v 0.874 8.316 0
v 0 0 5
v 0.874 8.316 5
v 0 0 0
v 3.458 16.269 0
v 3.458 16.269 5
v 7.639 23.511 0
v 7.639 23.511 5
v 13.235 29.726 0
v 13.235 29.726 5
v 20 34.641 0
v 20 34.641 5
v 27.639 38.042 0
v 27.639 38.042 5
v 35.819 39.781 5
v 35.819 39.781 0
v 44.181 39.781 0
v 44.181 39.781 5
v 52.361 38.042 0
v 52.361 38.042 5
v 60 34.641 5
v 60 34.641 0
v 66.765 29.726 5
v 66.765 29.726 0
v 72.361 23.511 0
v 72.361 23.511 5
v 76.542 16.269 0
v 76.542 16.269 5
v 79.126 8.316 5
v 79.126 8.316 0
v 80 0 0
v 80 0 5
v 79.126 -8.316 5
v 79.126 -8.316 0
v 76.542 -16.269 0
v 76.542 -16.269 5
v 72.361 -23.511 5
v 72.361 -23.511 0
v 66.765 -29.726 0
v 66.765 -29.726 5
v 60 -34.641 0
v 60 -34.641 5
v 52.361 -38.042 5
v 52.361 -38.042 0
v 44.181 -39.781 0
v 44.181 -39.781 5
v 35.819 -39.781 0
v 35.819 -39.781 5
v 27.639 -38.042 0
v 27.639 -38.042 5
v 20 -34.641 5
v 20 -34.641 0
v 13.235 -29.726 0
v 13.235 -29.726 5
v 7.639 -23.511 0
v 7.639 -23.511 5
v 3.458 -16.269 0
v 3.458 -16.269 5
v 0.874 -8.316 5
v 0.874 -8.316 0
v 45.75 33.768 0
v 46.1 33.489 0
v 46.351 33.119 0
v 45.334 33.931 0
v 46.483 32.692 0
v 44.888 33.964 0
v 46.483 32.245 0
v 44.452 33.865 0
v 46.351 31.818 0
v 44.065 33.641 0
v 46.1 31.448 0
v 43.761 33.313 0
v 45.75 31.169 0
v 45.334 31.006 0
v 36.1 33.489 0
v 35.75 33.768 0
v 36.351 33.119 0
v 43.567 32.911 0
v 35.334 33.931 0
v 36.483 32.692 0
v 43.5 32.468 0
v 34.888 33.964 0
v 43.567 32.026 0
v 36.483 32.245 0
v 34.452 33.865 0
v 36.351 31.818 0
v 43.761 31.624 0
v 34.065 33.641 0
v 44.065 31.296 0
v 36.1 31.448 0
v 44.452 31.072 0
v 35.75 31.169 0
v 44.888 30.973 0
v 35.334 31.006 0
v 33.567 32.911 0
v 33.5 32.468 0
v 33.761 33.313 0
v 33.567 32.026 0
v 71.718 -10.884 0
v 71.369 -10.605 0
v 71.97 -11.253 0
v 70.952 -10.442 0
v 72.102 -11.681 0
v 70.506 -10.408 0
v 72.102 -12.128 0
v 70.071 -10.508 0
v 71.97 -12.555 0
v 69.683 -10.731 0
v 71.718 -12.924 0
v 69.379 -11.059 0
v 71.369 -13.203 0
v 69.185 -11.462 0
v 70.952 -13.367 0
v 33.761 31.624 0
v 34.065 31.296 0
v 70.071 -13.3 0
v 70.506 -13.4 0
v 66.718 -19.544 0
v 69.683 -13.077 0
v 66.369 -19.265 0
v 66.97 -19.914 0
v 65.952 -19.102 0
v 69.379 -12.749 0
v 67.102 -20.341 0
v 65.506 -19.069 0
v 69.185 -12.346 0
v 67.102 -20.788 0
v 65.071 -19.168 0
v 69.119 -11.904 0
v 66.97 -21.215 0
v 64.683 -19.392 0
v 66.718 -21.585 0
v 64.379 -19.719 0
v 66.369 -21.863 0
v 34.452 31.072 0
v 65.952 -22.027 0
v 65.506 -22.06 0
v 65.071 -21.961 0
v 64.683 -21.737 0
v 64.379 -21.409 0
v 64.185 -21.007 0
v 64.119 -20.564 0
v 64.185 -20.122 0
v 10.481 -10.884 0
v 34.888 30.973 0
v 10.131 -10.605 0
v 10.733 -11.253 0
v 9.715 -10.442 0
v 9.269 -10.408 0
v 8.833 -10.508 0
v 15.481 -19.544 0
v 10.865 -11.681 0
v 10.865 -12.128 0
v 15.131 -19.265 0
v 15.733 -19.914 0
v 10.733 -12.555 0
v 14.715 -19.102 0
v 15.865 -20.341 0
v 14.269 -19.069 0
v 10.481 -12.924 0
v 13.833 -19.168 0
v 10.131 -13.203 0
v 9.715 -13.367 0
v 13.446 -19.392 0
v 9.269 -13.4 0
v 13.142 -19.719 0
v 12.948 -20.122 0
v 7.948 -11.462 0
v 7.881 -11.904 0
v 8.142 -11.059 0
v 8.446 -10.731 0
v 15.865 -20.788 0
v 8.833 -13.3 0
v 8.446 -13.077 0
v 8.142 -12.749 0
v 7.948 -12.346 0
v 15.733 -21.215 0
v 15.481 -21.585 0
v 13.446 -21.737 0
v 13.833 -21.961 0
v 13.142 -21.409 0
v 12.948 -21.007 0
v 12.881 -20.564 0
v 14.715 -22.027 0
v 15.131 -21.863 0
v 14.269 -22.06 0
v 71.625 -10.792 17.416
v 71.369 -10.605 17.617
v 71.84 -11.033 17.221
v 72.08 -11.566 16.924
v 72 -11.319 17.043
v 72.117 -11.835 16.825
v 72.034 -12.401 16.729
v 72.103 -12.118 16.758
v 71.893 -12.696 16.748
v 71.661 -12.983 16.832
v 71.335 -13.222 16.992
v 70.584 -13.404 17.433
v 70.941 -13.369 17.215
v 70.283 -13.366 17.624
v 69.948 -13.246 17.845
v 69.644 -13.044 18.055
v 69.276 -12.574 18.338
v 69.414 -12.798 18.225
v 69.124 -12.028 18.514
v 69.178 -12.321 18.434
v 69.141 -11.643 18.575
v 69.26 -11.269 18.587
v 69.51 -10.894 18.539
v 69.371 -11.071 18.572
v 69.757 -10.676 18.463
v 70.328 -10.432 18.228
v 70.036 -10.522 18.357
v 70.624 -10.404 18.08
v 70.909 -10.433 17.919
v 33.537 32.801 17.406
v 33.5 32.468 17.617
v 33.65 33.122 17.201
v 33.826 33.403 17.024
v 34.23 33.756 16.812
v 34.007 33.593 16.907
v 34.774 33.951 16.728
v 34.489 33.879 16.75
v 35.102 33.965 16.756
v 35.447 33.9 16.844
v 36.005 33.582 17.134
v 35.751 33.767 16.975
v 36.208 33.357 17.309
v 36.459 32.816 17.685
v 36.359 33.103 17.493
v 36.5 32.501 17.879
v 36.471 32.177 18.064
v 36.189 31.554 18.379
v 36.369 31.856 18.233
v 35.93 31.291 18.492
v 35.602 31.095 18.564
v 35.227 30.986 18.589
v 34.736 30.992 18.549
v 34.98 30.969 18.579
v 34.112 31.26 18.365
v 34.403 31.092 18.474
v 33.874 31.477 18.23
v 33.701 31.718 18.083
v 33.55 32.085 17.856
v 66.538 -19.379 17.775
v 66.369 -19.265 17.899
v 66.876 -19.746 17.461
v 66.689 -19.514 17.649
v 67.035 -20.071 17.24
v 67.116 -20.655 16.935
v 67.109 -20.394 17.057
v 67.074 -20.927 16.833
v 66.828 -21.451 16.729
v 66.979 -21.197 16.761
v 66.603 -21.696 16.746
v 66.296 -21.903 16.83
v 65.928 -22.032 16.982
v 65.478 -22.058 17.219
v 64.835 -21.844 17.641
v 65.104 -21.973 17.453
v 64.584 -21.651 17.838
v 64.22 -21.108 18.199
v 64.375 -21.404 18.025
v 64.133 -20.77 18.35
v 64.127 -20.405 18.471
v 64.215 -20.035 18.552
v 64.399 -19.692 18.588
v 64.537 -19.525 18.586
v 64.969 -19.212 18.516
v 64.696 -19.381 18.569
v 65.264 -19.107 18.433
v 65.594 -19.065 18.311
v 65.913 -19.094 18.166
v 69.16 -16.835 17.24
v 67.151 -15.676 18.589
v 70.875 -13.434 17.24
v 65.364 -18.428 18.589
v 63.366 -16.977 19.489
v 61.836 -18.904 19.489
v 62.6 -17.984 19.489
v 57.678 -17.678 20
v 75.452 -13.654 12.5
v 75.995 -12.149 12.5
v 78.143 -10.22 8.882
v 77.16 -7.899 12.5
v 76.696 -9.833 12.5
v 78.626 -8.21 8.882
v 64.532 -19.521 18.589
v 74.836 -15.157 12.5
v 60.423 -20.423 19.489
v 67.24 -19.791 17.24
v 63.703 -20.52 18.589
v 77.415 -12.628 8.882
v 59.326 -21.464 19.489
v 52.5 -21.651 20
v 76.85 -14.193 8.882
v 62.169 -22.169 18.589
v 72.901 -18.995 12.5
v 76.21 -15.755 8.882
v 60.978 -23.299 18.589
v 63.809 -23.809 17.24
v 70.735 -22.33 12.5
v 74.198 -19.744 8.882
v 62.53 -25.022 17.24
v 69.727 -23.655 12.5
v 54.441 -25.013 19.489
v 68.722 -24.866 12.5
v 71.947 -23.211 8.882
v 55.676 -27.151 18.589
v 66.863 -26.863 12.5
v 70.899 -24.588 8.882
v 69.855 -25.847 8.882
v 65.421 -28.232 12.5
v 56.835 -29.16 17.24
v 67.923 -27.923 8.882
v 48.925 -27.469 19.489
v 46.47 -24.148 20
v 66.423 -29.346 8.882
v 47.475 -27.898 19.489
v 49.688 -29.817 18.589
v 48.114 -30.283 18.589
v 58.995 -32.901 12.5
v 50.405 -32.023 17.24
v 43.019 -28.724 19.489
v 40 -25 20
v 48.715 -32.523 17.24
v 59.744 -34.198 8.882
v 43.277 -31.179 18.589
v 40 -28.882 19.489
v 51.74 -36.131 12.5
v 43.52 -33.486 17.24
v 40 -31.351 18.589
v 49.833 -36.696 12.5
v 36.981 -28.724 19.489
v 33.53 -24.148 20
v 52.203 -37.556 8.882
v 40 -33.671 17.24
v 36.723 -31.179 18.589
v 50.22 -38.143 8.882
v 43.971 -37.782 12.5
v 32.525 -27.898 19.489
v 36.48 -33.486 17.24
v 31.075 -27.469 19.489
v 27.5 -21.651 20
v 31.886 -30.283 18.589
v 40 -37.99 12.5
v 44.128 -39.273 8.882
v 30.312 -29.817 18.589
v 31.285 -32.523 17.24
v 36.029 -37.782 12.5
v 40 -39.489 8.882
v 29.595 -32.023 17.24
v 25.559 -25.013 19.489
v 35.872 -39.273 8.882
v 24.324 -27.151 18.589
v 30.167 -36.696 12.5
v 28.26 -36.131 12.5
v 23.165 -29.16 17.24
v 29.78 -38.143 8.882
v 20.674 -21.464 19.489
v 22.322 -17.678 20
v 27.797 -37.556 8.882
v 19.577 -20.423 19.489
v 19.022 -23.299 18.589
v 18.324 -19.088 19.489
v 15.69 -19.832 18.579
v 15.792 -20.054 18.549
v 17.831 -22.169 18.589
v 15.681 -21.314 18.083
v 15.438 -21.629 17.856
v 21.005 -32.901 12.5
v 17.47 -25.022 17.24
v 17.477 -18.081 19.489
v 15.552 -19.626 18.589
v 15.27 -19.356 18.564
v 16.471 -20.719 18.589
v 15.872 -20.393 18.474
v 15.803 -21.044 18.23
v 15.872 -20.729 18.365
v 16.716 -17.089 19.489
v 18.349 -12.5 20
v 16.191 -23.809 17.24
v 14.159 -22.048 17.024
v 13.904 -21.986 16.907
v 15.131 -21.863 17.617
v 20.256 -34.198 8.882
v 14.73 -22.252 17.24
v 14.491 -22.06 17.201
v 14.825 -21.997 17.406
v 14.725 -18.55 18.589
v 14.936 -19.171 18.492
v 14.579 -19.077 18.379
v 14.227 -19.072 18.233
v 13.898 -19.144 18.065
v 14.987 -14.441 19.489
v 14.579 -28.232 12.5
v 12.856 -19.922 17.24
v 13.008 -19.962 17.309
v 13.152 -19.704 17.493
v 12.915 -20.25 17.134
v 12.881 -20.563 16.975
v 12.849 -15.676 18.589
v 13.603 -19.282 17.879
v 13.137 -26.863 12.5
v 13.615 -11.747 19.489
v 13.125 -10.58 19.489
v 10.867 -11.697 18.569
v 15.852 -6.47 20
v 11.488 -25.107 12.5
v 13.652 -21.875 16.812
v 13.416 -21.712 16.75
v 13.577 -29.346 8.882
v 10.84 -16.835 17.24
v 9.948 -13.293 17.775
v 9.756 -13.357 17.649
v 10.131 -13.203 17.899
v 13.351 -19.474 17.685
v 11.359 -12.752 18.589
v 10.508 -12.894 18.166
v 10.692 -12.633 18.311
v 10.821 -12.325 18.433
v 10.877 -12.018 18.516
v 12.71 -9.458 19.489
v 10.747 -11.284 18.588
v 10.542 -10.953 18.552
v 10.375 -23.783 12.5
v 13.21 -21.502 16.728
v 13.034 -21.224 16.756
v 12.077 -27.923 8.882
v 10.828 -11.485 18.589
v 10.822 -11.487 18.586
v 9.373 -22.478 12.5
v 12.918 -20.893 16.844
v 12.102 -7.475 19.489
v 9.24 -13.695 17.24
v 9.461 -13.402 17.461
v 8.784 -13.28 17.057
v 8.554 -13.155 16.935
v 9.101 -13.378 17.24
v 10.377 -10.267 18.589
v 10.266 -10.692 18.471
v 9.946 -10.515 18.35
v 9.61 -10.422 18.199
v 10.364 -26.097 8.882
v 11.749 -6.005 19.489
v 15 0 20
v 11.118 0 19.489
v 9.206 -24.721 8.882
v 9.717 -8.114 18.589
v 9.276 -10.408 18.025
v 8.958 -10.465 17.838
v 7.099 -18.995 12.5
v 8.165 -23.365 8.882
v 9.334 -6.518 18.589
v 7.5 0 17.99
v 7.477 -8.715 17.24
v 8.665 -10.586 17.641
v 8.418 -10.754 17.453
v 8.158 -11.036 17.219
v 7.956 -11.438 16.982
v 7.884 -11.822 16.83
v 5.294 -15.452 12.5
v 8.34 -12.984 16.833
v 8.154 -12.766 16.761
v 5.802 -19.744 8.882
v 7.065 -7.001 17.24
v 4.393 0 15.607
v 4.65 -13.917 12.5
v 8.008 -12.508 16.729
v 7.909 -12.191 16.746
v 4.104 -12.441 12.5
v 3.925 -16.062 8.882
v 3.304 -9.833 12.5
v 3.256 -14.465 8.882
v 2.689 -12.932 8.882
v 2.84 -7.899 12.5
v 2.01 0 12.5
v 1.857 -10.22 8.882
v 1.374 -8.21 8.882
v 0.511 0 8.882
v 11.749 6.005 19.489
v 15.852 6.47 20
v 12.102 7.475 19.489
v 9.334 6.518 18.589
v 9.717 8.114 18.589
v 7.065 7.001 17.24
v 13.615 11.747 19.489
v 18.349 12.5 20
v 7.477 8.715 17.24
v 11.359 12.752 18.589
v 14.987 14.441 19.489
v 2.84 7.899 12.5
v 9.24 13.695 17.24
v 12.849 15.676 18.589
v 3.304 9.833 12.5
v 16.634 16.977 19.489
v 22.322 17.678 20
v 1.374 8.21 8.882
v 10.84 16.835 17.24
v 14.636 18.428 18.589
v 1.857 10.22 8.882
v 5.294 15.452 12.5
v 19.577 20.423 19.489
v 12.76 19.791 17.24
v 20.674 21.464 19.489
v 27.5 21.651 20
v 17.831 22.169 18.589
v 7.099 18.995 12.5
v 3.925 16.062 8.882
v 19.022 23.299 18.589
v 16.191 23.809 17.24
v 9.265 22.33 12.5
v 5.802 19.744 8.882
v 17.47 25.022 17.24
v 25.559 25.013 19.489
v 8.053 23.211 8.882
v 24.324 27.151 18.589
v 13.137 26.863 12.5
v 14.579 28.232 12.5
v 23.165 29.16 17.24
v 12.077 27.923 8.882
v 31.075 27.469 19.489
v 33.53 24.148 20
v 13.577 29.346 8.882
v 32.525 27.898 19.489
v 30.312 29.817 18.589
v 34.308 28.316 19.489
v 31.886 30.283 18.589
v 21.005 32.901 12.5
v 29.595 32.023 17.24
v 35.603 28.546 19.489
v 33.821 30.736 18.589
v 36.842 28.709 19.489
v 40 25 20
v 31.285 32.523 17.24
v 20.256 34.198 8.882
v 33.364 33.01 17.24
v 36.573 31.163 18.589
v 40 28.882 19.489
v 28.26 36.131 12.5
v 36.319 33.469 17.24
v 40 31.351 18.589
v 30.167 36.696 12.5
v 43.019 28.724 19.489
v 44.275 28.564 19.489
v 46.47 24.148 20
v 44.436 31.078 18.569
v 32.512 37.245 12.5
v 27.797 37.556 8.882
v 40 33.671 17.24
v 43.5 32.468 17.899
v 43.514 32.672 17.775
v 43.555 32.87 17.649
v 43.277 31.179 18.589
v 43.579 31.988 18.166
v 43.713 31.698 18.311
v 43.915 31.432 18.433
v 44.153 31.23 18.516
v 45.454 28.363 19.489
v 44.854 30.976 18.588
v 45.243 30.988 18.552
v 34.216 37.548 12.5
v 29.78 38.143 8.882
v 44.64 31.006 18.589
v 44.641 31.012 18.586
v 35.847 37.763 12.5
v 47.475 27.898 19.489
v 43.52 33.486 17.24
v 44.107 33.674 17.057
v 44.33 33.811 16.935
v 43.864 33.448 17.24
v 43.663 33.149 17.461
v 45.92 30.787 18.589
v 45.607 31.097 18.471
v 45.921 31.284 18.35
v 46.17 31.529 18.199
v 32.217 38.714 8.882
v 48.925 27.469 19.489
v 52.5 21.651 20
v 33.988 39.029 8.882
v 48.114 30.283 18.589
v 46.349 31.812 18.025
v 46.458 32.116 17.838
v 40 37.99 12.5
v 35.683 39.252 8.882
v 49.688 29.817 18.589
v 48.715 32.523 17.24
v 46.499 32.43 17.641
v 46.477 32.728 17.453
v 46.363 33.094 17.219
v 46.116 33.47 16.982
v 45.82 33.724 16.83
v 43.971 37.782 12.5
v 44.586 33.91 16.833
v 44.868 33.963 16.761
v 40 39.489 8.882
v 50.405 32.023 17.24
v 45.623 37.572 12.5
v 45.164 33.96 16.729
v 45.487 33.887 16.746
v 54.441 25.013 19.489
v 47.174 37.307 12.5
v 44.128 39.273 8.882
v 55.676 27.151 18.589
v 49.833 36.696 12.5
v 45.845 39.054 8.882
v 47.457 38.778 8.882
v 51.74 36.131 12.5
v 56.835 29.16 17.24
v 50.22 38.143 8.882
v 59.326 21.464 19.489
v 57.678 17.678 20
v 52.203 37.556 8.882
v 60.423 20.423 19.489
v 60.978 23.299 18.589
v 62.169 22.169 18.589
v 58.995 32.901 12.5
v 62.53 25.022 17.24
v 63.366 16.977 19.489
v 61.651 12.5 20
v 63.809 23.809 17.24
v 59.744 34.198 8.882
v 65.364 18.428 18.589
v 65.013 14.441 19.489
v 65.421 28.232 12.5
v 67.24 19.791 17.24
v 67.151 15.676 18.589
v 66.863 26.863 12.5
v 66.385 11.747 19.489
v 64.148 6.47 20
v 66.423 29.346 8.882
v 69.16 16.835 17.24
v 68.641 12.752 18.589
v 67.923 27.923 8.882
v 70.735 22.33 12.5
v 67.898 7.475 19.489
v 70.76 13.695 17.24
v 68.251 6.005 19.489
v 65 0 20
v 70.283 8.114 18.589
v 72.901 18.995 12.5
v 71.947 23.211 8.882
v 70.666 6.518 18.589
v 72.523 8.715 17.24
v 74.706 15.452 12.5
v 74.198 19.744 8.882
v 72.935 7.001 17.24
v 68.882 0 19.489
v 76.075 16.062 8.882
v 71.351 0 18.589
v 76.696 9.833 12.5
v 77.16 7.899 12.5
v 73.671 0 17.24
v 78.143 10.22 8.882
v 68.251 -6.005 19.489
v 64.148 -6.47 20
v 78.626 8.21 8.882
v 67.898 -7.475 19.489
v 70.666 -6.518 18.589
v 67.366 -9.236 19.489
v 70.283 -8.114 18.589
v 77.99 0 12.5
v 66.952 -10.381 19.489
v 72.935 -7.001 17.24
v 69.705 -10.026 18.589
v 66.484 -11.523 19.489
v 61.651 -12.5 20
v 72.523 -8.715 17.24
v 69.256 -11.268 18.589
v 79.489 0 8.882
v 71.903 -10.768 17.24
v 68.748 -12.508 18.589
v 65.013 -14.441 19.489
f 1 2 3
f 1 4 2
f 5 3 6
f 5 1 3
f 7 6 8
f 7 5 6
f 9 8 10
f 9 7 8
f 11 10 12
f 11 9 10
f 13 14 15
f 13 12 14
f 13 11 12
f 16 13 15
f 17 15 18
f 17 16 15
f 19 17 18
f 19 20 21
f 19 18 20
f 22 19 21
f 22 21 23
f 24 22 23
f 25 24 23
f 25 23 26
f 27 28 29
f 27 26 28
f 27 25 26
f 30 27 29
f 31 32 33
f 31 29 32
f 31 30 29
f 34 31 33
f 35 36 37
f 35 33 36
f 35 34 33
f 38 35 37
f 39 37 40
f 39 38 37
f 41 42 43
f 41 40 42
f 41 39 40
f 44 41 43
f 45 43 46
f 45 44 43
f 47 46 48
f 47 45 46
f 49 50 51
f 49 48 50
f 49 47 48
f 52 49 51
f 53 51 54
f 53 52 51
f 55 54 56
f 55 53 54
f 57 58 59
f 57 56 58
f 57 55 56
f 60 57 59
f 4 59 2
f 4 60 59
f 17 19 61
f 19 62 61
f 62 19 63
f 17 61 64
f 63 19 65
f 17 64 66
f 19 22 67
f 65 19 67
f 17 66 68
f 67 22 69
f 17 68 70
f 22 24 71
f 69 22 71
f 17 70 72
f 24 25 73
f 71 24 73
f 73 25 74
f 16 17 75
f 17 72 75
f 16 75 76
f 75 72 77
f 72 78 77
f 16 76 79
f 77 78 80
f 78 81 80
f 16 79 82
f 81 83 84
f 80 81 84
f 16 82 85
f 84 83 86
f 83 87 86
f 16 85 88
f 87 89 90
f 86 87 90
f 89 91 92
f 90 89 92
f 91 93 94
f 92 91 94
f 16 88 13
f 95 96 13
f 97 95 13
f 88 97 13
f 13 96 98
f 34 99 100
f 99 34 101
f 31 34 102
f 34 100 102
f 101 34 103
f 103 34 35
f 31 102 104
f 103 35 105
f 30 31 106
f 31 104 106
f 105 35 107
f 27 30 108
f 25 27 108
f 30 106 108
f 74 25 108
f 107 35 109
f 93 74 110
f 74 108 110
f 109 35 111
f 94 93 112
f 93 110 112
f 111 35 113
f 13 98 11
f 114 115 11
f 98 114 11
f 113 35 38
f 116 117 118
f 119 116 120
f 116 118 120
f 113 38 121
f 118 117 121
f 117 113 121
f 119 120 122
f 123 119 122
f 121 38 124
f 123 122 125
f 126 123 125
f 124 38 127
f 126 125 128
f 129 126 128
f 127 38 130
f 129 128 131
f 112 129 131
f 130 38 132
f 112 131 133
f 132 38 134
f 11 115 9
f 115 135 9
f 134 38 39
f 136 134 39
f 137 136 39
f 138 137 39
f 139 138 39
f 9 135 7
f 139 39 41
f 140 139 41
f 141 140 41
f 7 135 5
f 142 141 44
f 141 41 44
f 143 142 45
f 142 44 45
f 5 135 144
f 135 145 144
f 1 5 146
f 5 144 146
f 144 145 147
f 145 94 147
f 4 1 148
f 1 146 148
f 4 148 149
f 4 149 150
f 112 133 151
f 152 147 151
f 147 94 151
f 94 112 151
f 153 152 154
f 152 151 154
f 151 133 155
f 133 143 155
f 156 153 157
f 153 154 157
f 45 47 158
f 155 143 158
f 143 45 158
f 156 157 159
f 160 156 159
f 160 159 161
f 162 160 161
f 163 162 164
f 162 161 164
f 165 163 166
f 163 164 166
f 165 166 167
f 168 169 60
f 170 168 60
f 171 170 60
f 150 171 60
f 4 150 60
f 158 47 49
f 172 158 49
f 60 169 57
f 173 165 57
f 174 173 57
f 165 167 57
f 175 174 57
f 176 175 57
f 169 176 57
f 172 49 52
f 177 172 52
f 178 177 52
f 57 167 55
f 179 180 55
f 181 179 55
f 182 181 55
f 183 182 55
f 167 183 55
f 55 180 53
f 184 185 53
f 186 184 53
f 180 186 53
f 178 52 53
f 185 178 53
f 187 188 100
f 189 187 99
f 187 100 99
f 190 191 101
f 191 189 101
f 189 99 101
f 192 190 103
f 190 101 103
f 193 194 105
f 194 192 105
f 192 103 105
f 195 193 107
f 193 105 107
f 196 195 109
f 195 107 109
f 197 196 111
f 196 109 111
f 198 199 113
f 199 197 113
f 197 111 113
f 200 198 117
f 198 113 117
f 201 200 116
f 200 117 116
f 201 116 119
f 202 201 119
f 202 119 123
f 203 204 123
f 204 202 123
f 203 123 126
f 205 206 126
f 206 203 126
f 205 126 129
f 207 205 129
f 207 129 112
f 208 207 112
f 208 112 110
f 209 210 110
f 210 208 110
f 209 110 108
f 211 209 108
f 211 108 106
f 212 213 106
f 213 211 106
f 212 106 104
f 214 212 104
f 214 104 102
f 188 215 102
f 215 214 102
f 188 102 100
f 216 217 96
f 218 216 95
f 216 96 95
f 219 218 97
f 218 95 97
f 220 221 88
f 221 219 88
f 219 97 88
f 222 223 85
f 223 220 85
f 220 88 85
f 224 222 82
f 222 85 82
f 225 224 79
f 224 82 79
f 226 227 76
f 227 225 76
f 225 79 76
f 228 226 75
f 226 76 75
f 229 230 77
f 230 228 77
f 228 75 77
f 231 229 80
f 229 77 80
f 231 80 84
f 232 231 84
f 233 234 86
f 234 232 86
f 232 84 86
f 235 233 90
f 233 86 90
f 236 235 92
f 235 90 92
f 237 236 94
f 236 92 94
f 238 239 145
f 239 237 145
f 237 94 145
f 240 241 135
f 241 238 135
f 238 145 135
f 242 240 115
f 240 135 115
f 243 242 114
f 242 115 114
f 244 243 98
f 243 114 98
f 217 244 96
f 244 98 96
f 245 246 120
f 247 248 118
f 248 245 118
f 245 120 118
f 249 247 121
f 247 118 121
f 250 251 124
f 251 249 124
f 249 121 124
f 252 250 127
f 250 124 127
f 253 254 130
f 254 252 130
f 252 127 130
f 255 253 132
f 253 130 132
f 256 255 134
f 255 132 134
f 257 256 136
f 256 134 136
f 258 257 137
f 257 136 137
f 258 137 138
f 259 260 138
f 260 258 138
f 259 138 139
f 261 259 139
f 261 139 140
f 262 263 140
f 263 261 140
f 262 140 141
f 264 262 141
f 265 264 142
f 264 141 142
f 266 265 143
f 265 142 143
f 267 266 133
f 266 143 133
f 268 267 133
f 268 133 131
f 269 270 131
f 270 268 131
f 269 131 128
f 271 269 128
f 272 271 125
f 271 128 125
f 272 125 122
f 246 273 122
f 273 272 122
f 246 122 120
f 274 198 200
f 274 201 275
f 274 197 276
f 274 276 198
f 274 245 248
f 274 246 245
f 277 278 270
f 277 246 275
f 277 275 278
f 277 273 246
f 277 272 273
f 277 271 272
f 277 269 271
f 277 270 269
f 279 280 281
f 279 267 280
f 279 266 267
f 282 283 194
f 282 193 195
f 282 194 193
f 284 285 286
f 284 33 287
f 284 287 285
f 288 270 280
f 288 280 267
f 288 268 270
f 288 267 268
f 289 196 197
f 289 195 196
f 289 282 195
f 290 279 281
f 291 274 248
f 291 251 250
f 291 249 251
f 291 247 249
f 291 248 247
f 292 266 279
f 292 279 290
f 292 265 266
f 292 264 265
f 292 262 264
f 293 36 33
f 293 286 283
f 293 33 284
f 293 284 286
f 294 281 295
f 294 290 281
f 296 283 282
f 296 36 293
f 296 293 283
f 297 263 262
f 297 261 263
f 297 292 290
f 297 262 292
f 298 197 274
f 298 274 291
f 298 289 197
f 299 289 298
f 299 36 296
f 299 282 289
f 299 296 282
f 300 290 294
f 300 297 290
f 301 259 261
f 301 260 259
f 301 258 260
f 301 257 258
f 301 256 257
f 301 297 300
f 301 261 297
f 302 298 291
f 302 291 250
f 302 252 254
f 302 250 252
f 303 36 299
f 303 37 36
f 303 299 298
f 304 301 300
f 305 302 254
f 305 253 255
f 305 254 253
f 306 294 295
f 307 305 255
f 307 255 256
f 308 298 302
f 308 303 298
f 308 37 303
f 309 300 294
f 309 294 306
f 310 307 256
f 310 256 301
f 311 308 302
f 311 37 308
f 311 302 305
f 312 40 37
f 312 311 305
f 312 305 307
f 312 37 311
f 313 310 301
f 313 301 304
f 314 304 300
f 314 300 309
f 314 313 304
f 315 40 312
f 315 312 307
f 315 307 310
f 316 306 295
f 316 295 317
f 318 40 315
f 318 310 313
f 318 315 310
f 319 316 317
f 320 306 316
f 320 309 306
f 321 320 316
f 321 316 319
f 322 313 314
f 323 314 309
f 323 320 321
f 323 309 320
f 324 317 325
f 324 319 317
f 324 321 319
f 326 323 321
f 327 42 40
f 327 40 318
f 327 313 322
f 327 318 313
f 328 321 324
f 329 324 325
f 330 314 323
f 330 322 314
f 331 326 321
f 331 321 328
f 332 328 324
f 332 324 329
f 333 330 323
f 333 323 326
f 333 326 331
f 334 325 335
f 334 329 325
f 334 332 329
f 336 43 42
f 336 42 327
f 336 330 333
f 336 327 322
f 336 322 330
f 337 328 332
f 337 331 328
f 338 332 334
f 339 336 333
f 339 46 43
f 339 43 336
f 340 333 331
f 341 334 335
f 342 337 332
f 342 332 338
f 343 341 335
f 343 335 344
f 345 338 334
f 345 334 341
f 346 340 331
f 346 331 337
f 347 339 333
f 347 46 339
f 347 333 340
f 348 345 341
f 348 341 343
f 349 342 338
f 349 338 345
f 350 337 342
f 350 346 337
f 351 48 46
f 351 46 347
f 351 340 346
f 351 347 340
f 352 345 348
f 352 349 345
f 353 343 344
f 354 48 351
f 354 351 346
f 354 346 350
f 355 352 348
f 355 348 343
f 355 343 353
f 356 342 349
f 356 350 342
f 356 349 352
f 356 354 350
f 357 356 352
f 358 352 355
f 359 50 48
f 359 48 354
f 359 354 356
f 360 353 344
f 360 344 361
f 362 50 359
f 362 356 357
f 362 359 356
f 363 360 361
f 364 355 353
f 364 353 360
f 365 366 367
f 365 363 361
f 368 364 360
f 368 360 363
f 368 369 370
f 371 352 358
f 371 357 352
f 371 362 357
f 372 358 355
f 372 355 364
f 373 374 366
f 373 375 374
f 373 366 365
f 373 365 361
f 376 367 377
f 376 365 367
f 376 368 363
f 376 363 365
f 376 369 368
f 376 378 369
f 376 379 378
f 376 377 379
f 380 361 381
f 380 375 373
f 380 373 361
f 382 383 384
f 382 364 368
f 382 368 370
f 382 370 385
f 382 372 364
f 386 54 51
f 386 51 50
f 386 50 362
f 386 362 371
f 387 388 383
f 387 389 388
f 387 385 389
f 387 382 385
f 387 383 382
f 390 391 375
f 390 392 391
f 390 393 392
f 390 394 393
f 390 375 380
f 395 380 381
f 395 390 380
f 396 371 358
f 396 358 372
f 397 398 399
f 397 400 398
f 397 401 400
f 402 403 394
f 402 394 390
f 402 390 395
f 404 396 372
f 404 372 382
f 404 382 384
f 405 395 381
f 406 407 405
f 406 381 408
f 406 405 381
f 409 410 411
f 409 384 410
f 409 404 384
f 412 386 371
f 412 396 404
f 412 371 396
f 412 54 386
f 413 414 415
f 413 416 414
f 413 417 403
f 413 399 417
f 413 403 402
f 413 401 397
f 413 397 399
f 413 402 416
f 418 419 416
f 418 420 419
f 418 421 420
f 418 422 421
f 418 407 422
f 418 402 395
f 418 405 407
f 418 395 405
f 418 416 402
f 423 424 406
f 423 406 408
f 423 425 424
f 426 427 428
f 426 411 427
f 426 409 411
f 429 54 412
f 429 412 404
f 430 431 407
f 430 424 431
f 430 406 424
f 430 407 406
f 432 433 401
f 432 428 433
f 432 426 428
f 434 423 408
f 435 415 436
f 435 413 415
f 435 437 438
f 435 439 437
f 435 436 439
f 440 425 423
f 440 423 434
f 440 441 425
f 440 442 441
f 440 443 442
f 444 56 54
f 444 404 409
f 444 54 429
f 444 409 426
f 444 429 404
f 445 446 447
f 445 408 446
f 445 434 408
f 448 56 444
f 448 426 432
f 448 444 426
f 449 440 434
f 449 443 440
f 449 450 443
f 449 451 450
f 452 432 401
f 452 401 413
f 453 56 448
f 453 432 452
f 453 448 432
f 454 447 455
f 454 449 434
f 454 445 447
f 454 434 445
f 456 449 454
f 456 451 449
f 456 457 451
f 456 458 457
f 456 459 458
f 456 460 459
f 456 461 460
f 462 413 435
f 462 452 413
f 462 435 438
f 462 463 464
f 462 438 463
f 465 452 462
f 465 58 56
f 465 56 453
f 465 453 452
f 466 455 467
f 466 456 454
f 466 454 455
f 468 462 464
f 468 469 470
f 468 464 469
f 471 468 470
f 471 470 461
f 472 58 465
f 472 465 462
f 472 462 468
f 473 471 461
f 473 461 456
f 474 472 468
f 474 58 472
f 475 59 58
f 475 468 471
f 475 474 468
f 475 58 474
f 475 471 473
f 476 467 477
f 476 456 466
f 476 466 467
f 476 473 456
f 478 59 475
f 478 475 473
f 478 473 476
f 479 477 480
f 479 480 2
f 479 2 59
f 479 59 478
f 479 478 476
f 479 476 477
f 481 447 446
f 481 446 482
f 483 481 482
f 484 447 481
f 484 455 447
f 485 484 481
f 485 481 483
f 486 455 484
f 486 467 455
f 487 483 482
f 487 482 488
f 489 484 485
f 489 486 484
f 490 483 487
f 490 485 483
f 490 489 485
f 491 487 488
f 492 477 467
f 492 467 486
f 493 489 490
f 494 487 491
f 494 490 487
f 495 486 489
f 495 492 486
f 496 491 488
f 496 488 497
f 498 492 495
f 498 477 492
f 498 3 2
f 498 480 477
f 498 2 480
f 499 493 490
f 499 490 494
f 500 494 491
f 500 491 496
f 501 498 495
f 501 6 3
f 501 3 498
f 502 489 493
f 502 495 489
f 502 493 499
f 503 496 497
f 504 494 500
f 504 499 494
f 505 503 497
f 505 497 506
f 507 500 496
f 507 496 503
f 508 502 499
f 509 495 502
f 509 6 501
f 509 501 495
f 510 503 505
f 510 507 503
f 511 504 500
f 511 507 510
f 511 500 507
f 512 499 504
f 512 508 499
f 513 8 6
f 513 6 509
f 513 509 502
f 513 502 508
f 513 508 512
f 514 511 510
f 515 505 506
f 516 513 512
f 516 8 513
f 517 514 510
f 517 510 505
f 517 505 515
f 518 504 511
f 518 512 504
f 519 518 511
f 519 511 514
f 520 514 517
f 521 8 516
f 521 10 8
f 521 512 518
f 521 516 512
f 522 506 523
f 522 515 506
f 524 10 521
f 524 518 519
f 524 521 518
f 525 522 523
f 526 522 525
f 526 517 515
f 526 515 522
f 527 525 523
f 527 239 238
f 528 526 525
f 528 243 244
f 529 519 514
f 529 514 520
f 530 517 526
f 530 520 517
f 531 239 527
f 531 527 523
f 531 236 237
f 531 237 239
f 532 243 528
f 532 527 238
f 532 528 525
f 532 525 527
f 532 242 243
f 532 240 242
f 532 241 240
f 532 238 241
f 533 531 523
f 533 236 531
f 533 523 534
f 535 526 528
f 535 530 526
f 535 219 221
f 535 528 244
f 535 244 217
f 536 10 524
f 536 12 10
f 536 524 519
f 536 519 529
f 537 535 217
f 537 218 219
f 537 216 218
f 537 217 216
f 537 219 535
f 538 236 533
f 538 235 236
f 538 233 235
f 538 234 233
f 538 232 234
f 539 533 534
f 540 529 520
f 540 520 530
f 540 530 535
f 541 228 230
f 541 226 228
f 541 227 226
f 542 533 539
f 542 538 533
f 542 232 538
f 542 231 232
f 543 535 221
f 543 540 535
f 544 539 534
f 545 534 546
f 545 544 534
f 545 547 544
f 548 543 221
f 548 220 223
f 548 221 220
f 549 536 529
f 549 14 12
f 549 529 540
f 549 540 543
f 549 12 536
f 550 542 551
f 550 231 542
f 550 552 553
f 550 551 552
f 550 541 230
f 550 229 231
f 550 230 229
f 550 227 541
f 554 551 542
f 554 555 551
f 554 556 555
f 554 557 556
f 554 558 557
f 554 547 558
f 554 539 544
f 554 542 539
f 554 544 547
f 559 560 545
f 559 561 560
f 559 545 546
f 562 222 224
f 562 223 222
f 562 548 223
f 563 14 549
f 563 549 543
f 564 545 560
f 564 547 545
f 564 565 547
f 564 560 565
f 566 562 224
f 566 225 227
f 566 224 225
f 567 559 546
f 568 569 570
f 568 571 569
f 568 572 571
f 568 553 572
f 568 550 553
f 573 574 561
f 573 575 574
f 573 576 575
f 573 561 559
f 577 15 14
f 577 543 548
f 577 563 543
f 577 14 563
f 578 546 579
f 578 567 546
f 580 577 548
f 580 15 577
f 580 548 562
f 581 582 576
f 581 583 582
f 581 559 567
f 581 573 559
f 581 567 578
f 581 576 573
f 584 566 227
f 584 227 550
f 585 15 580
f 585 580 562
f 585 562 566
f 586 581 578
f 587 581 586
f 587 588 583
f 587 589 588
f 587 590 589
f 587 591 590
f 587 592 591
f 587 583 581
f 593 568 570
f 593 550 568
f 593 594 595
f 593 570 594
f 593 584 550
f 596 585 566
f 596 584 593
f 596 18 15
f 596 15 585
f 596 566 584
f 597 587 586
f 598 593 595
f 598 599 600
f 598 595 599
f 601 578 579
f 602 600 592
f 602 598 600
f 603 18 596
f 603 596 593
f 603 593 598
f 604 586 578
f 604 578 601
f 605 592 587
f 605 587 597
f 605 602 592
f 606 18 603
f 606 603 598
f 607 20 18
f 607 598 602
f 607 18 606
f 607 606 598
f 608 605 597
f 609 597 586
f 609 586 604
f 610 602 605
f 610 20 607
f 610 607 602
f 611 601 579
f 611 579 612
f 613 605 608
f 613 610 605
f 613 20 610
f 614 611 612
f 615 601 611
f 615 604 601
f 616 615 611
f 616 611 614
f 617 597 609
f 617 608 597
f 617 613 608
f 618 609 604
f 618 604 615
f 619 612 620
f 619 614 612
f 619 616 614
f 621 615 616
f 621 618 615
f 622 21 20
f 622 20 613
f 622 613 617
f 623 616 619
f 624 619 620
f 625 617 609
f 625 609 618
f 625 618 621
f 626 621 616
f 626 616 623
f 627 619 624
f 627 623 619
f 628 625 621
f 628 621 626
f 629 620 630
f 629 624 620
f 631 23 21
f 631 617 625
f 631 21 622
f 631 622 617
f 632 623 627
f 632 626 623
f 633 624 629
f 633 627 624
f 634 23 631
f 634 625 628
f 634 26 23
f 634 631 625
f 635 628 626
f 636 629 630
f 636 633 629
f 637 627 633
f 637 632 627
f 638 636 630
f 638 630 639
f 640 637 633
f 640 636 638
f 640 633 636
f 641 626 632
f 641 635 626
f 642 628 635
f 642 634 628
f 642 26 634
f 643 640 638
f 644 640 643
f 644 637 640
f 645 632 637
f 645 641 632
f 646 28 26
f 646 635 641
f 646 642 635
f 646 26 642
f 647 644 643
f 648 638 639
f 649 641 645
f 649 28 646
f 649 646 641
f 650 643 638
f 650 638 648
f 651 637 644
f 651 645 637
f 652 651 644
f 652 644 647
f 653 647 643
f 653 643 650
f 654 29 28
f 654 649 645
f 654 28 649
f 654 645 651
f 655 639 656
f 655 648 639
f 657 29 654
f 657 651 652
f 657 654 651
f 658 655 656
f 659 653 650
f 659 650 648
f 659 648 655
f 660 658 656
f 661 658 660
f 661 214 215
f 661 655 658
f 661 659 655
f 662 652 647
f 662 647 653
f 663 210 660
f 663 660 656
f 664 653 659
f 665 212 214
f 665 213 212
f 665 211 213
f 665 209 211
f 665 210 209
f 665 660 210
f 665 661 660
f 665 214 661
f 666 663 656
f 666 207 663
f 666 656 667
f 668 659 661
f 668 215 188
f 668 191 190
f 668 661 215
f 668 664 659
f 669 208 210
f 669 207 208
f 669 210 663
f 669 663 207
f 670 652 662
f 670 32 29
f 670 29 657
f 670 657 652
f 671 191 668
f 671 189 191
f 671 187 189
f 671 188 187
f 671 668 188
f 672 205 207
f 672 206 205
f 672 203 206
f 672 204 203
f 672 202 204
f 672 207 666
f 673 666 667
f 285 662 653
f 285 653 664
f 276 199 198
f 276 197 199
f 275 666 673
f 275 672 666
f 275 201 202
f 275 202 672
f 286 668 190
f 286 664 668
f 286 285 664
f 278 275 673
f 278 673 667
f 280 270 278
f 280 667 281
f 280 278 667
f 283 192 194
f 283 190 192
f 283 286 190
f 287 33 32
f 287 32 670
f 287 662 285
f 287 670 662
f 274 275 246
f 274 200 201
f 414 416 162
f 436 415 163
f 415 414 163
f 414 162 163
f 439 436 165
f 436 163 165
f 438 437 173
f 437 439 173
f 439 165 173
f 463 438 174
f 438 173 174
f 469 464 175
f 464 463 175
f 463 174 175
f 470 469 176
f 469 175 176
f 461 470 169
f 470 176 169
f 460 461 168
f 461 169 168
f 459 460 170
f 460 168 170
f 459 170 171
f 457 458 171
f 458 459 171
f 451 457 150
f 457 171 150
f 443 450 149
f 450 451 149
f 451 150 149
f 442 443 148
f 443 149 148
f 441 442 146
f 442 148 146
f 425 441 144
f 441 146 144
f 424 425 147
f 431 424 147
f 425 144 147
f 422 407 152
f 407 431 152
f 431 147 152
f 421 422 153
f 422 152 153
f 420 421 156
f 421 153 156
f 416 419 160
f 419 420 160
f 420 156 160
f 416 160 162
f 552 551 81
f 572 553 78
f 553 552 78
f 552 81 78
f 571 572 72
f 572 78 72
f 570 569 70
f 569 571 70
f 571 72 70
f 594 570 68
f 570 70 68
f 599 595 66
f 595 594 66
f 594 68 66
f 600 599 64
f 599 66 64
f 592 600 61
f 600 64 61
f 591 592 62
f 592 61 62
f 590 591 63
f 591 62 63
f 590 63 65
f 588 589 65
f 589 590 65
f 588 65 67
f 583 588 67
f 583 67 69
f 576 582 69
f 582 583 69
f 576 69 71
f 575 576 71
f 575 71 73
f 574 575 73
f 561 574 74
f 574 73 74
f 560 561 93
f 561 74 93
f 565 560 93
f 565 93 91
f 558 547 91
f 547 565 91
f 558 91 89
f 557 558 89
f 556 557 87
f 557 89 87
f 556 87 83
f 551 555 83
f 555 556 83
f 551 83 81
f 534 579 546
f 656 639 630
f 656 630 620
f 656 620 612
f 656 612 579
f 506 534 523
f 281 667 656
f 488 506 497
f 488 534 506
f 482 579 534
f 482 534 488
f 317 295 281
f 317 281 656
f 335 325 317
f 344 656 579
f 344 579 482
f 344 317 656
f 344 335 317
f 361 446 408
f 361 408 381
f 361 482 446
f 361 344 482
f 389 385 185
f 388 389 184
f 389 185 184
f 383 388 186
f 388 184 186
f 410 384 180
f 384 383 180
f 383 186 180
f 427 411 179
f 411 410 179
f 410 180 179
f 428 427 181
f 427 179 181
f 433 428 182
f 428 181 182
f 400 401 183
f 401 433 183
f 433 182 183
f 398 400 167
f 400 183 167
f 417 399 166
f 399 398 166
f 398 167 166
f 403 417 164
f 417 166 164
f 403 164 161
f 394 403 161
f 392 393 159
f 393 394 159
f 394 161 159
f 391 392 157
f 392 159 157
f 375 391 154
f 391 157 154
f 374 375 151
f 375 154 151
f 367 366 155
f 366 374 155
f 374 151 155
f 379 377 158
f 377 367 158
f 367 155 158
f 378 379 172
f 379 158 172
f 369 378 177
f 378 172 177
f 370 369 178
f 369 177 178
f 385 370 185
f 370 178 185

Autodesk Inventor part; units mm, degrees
ref_plane "YZ Plane" through (0, 0, 0) normal (1, 0, 0) x (0, 1, 0)
ref_plane "XZ Plane" through (0, 0, 0) normal (0, 1, 0) x (-1, 0, 0)
ref_plane "XY Plane" through (0, 0, 0) normal (0, 0, 1) x (1, 0, 0)
sketch "Sketch1" plane through (0, 0, 0) normal (0, 1, 0) x (-1, 0, 0)
  line L0 (0, 0) -> (-40, 0)
  line L1 (-40, 0) -> (-40, 20)
  line L2 (-40, 20) -> (0, 20)
  line L3 (0, 20) -> (0, 0)
  dimension "d0" = 40
  dimension "d1" = 20
revolve "Revolution1" add sketch "Sketch1" angle 360 about axis through (40, 0, 0) along (0, 0, 1)
fillet "Fillet1" radius 15 1 edges at (80, 0, 20)
sketch "Sketch2" plane through (40, 0, 0) normal (0, 0, -1) x (-1, 0, 0)
  circle A0 centre (0, 0) radius 35
  circle A1 centre (0, 0) radius 40 projected
  point P0 (40, 0)
  dimension "d4" = 70
  dimension "d5" = 5
sketch "Sketch3" plane through (40, 0, 0) normal (0, 0, -1) x (-1, 0, 0)
  circle A0 centre (-5, 32.4685) radius 1.5
  circle A1 centre (5, 32.4685) radius 1.5
  point P0 (40, 0)
  point P1 (0, 0)
  dimension "d6" = 3
  dimension "d7" = 3
  dimension "d14" = 10
  dimension "d15" = 5
  dimension "d16" = 5
  dimension "d17" = 32.4685
extrude "Extrusion1" cut sketch "Sketch3" against normal blind 20
sketch "Sketch4" plane through (0, 0, 0) normal (0, 1, 0) x (-1, 0, 0)
  line L0 (-40, 27.46) -> (-40, -52.54) construction
  point P0 (0, 0)
  dimension "d20" = 80
  dimension "d21" = 80
pattern_circular "Circular Pattern1" count 3 over 360 about axis through (40, 0, 27.46) along (0, 0, -1) of "Extrusion1"
equation "\"d6\" = d7"
properties part number "Top_and_Bottom"
